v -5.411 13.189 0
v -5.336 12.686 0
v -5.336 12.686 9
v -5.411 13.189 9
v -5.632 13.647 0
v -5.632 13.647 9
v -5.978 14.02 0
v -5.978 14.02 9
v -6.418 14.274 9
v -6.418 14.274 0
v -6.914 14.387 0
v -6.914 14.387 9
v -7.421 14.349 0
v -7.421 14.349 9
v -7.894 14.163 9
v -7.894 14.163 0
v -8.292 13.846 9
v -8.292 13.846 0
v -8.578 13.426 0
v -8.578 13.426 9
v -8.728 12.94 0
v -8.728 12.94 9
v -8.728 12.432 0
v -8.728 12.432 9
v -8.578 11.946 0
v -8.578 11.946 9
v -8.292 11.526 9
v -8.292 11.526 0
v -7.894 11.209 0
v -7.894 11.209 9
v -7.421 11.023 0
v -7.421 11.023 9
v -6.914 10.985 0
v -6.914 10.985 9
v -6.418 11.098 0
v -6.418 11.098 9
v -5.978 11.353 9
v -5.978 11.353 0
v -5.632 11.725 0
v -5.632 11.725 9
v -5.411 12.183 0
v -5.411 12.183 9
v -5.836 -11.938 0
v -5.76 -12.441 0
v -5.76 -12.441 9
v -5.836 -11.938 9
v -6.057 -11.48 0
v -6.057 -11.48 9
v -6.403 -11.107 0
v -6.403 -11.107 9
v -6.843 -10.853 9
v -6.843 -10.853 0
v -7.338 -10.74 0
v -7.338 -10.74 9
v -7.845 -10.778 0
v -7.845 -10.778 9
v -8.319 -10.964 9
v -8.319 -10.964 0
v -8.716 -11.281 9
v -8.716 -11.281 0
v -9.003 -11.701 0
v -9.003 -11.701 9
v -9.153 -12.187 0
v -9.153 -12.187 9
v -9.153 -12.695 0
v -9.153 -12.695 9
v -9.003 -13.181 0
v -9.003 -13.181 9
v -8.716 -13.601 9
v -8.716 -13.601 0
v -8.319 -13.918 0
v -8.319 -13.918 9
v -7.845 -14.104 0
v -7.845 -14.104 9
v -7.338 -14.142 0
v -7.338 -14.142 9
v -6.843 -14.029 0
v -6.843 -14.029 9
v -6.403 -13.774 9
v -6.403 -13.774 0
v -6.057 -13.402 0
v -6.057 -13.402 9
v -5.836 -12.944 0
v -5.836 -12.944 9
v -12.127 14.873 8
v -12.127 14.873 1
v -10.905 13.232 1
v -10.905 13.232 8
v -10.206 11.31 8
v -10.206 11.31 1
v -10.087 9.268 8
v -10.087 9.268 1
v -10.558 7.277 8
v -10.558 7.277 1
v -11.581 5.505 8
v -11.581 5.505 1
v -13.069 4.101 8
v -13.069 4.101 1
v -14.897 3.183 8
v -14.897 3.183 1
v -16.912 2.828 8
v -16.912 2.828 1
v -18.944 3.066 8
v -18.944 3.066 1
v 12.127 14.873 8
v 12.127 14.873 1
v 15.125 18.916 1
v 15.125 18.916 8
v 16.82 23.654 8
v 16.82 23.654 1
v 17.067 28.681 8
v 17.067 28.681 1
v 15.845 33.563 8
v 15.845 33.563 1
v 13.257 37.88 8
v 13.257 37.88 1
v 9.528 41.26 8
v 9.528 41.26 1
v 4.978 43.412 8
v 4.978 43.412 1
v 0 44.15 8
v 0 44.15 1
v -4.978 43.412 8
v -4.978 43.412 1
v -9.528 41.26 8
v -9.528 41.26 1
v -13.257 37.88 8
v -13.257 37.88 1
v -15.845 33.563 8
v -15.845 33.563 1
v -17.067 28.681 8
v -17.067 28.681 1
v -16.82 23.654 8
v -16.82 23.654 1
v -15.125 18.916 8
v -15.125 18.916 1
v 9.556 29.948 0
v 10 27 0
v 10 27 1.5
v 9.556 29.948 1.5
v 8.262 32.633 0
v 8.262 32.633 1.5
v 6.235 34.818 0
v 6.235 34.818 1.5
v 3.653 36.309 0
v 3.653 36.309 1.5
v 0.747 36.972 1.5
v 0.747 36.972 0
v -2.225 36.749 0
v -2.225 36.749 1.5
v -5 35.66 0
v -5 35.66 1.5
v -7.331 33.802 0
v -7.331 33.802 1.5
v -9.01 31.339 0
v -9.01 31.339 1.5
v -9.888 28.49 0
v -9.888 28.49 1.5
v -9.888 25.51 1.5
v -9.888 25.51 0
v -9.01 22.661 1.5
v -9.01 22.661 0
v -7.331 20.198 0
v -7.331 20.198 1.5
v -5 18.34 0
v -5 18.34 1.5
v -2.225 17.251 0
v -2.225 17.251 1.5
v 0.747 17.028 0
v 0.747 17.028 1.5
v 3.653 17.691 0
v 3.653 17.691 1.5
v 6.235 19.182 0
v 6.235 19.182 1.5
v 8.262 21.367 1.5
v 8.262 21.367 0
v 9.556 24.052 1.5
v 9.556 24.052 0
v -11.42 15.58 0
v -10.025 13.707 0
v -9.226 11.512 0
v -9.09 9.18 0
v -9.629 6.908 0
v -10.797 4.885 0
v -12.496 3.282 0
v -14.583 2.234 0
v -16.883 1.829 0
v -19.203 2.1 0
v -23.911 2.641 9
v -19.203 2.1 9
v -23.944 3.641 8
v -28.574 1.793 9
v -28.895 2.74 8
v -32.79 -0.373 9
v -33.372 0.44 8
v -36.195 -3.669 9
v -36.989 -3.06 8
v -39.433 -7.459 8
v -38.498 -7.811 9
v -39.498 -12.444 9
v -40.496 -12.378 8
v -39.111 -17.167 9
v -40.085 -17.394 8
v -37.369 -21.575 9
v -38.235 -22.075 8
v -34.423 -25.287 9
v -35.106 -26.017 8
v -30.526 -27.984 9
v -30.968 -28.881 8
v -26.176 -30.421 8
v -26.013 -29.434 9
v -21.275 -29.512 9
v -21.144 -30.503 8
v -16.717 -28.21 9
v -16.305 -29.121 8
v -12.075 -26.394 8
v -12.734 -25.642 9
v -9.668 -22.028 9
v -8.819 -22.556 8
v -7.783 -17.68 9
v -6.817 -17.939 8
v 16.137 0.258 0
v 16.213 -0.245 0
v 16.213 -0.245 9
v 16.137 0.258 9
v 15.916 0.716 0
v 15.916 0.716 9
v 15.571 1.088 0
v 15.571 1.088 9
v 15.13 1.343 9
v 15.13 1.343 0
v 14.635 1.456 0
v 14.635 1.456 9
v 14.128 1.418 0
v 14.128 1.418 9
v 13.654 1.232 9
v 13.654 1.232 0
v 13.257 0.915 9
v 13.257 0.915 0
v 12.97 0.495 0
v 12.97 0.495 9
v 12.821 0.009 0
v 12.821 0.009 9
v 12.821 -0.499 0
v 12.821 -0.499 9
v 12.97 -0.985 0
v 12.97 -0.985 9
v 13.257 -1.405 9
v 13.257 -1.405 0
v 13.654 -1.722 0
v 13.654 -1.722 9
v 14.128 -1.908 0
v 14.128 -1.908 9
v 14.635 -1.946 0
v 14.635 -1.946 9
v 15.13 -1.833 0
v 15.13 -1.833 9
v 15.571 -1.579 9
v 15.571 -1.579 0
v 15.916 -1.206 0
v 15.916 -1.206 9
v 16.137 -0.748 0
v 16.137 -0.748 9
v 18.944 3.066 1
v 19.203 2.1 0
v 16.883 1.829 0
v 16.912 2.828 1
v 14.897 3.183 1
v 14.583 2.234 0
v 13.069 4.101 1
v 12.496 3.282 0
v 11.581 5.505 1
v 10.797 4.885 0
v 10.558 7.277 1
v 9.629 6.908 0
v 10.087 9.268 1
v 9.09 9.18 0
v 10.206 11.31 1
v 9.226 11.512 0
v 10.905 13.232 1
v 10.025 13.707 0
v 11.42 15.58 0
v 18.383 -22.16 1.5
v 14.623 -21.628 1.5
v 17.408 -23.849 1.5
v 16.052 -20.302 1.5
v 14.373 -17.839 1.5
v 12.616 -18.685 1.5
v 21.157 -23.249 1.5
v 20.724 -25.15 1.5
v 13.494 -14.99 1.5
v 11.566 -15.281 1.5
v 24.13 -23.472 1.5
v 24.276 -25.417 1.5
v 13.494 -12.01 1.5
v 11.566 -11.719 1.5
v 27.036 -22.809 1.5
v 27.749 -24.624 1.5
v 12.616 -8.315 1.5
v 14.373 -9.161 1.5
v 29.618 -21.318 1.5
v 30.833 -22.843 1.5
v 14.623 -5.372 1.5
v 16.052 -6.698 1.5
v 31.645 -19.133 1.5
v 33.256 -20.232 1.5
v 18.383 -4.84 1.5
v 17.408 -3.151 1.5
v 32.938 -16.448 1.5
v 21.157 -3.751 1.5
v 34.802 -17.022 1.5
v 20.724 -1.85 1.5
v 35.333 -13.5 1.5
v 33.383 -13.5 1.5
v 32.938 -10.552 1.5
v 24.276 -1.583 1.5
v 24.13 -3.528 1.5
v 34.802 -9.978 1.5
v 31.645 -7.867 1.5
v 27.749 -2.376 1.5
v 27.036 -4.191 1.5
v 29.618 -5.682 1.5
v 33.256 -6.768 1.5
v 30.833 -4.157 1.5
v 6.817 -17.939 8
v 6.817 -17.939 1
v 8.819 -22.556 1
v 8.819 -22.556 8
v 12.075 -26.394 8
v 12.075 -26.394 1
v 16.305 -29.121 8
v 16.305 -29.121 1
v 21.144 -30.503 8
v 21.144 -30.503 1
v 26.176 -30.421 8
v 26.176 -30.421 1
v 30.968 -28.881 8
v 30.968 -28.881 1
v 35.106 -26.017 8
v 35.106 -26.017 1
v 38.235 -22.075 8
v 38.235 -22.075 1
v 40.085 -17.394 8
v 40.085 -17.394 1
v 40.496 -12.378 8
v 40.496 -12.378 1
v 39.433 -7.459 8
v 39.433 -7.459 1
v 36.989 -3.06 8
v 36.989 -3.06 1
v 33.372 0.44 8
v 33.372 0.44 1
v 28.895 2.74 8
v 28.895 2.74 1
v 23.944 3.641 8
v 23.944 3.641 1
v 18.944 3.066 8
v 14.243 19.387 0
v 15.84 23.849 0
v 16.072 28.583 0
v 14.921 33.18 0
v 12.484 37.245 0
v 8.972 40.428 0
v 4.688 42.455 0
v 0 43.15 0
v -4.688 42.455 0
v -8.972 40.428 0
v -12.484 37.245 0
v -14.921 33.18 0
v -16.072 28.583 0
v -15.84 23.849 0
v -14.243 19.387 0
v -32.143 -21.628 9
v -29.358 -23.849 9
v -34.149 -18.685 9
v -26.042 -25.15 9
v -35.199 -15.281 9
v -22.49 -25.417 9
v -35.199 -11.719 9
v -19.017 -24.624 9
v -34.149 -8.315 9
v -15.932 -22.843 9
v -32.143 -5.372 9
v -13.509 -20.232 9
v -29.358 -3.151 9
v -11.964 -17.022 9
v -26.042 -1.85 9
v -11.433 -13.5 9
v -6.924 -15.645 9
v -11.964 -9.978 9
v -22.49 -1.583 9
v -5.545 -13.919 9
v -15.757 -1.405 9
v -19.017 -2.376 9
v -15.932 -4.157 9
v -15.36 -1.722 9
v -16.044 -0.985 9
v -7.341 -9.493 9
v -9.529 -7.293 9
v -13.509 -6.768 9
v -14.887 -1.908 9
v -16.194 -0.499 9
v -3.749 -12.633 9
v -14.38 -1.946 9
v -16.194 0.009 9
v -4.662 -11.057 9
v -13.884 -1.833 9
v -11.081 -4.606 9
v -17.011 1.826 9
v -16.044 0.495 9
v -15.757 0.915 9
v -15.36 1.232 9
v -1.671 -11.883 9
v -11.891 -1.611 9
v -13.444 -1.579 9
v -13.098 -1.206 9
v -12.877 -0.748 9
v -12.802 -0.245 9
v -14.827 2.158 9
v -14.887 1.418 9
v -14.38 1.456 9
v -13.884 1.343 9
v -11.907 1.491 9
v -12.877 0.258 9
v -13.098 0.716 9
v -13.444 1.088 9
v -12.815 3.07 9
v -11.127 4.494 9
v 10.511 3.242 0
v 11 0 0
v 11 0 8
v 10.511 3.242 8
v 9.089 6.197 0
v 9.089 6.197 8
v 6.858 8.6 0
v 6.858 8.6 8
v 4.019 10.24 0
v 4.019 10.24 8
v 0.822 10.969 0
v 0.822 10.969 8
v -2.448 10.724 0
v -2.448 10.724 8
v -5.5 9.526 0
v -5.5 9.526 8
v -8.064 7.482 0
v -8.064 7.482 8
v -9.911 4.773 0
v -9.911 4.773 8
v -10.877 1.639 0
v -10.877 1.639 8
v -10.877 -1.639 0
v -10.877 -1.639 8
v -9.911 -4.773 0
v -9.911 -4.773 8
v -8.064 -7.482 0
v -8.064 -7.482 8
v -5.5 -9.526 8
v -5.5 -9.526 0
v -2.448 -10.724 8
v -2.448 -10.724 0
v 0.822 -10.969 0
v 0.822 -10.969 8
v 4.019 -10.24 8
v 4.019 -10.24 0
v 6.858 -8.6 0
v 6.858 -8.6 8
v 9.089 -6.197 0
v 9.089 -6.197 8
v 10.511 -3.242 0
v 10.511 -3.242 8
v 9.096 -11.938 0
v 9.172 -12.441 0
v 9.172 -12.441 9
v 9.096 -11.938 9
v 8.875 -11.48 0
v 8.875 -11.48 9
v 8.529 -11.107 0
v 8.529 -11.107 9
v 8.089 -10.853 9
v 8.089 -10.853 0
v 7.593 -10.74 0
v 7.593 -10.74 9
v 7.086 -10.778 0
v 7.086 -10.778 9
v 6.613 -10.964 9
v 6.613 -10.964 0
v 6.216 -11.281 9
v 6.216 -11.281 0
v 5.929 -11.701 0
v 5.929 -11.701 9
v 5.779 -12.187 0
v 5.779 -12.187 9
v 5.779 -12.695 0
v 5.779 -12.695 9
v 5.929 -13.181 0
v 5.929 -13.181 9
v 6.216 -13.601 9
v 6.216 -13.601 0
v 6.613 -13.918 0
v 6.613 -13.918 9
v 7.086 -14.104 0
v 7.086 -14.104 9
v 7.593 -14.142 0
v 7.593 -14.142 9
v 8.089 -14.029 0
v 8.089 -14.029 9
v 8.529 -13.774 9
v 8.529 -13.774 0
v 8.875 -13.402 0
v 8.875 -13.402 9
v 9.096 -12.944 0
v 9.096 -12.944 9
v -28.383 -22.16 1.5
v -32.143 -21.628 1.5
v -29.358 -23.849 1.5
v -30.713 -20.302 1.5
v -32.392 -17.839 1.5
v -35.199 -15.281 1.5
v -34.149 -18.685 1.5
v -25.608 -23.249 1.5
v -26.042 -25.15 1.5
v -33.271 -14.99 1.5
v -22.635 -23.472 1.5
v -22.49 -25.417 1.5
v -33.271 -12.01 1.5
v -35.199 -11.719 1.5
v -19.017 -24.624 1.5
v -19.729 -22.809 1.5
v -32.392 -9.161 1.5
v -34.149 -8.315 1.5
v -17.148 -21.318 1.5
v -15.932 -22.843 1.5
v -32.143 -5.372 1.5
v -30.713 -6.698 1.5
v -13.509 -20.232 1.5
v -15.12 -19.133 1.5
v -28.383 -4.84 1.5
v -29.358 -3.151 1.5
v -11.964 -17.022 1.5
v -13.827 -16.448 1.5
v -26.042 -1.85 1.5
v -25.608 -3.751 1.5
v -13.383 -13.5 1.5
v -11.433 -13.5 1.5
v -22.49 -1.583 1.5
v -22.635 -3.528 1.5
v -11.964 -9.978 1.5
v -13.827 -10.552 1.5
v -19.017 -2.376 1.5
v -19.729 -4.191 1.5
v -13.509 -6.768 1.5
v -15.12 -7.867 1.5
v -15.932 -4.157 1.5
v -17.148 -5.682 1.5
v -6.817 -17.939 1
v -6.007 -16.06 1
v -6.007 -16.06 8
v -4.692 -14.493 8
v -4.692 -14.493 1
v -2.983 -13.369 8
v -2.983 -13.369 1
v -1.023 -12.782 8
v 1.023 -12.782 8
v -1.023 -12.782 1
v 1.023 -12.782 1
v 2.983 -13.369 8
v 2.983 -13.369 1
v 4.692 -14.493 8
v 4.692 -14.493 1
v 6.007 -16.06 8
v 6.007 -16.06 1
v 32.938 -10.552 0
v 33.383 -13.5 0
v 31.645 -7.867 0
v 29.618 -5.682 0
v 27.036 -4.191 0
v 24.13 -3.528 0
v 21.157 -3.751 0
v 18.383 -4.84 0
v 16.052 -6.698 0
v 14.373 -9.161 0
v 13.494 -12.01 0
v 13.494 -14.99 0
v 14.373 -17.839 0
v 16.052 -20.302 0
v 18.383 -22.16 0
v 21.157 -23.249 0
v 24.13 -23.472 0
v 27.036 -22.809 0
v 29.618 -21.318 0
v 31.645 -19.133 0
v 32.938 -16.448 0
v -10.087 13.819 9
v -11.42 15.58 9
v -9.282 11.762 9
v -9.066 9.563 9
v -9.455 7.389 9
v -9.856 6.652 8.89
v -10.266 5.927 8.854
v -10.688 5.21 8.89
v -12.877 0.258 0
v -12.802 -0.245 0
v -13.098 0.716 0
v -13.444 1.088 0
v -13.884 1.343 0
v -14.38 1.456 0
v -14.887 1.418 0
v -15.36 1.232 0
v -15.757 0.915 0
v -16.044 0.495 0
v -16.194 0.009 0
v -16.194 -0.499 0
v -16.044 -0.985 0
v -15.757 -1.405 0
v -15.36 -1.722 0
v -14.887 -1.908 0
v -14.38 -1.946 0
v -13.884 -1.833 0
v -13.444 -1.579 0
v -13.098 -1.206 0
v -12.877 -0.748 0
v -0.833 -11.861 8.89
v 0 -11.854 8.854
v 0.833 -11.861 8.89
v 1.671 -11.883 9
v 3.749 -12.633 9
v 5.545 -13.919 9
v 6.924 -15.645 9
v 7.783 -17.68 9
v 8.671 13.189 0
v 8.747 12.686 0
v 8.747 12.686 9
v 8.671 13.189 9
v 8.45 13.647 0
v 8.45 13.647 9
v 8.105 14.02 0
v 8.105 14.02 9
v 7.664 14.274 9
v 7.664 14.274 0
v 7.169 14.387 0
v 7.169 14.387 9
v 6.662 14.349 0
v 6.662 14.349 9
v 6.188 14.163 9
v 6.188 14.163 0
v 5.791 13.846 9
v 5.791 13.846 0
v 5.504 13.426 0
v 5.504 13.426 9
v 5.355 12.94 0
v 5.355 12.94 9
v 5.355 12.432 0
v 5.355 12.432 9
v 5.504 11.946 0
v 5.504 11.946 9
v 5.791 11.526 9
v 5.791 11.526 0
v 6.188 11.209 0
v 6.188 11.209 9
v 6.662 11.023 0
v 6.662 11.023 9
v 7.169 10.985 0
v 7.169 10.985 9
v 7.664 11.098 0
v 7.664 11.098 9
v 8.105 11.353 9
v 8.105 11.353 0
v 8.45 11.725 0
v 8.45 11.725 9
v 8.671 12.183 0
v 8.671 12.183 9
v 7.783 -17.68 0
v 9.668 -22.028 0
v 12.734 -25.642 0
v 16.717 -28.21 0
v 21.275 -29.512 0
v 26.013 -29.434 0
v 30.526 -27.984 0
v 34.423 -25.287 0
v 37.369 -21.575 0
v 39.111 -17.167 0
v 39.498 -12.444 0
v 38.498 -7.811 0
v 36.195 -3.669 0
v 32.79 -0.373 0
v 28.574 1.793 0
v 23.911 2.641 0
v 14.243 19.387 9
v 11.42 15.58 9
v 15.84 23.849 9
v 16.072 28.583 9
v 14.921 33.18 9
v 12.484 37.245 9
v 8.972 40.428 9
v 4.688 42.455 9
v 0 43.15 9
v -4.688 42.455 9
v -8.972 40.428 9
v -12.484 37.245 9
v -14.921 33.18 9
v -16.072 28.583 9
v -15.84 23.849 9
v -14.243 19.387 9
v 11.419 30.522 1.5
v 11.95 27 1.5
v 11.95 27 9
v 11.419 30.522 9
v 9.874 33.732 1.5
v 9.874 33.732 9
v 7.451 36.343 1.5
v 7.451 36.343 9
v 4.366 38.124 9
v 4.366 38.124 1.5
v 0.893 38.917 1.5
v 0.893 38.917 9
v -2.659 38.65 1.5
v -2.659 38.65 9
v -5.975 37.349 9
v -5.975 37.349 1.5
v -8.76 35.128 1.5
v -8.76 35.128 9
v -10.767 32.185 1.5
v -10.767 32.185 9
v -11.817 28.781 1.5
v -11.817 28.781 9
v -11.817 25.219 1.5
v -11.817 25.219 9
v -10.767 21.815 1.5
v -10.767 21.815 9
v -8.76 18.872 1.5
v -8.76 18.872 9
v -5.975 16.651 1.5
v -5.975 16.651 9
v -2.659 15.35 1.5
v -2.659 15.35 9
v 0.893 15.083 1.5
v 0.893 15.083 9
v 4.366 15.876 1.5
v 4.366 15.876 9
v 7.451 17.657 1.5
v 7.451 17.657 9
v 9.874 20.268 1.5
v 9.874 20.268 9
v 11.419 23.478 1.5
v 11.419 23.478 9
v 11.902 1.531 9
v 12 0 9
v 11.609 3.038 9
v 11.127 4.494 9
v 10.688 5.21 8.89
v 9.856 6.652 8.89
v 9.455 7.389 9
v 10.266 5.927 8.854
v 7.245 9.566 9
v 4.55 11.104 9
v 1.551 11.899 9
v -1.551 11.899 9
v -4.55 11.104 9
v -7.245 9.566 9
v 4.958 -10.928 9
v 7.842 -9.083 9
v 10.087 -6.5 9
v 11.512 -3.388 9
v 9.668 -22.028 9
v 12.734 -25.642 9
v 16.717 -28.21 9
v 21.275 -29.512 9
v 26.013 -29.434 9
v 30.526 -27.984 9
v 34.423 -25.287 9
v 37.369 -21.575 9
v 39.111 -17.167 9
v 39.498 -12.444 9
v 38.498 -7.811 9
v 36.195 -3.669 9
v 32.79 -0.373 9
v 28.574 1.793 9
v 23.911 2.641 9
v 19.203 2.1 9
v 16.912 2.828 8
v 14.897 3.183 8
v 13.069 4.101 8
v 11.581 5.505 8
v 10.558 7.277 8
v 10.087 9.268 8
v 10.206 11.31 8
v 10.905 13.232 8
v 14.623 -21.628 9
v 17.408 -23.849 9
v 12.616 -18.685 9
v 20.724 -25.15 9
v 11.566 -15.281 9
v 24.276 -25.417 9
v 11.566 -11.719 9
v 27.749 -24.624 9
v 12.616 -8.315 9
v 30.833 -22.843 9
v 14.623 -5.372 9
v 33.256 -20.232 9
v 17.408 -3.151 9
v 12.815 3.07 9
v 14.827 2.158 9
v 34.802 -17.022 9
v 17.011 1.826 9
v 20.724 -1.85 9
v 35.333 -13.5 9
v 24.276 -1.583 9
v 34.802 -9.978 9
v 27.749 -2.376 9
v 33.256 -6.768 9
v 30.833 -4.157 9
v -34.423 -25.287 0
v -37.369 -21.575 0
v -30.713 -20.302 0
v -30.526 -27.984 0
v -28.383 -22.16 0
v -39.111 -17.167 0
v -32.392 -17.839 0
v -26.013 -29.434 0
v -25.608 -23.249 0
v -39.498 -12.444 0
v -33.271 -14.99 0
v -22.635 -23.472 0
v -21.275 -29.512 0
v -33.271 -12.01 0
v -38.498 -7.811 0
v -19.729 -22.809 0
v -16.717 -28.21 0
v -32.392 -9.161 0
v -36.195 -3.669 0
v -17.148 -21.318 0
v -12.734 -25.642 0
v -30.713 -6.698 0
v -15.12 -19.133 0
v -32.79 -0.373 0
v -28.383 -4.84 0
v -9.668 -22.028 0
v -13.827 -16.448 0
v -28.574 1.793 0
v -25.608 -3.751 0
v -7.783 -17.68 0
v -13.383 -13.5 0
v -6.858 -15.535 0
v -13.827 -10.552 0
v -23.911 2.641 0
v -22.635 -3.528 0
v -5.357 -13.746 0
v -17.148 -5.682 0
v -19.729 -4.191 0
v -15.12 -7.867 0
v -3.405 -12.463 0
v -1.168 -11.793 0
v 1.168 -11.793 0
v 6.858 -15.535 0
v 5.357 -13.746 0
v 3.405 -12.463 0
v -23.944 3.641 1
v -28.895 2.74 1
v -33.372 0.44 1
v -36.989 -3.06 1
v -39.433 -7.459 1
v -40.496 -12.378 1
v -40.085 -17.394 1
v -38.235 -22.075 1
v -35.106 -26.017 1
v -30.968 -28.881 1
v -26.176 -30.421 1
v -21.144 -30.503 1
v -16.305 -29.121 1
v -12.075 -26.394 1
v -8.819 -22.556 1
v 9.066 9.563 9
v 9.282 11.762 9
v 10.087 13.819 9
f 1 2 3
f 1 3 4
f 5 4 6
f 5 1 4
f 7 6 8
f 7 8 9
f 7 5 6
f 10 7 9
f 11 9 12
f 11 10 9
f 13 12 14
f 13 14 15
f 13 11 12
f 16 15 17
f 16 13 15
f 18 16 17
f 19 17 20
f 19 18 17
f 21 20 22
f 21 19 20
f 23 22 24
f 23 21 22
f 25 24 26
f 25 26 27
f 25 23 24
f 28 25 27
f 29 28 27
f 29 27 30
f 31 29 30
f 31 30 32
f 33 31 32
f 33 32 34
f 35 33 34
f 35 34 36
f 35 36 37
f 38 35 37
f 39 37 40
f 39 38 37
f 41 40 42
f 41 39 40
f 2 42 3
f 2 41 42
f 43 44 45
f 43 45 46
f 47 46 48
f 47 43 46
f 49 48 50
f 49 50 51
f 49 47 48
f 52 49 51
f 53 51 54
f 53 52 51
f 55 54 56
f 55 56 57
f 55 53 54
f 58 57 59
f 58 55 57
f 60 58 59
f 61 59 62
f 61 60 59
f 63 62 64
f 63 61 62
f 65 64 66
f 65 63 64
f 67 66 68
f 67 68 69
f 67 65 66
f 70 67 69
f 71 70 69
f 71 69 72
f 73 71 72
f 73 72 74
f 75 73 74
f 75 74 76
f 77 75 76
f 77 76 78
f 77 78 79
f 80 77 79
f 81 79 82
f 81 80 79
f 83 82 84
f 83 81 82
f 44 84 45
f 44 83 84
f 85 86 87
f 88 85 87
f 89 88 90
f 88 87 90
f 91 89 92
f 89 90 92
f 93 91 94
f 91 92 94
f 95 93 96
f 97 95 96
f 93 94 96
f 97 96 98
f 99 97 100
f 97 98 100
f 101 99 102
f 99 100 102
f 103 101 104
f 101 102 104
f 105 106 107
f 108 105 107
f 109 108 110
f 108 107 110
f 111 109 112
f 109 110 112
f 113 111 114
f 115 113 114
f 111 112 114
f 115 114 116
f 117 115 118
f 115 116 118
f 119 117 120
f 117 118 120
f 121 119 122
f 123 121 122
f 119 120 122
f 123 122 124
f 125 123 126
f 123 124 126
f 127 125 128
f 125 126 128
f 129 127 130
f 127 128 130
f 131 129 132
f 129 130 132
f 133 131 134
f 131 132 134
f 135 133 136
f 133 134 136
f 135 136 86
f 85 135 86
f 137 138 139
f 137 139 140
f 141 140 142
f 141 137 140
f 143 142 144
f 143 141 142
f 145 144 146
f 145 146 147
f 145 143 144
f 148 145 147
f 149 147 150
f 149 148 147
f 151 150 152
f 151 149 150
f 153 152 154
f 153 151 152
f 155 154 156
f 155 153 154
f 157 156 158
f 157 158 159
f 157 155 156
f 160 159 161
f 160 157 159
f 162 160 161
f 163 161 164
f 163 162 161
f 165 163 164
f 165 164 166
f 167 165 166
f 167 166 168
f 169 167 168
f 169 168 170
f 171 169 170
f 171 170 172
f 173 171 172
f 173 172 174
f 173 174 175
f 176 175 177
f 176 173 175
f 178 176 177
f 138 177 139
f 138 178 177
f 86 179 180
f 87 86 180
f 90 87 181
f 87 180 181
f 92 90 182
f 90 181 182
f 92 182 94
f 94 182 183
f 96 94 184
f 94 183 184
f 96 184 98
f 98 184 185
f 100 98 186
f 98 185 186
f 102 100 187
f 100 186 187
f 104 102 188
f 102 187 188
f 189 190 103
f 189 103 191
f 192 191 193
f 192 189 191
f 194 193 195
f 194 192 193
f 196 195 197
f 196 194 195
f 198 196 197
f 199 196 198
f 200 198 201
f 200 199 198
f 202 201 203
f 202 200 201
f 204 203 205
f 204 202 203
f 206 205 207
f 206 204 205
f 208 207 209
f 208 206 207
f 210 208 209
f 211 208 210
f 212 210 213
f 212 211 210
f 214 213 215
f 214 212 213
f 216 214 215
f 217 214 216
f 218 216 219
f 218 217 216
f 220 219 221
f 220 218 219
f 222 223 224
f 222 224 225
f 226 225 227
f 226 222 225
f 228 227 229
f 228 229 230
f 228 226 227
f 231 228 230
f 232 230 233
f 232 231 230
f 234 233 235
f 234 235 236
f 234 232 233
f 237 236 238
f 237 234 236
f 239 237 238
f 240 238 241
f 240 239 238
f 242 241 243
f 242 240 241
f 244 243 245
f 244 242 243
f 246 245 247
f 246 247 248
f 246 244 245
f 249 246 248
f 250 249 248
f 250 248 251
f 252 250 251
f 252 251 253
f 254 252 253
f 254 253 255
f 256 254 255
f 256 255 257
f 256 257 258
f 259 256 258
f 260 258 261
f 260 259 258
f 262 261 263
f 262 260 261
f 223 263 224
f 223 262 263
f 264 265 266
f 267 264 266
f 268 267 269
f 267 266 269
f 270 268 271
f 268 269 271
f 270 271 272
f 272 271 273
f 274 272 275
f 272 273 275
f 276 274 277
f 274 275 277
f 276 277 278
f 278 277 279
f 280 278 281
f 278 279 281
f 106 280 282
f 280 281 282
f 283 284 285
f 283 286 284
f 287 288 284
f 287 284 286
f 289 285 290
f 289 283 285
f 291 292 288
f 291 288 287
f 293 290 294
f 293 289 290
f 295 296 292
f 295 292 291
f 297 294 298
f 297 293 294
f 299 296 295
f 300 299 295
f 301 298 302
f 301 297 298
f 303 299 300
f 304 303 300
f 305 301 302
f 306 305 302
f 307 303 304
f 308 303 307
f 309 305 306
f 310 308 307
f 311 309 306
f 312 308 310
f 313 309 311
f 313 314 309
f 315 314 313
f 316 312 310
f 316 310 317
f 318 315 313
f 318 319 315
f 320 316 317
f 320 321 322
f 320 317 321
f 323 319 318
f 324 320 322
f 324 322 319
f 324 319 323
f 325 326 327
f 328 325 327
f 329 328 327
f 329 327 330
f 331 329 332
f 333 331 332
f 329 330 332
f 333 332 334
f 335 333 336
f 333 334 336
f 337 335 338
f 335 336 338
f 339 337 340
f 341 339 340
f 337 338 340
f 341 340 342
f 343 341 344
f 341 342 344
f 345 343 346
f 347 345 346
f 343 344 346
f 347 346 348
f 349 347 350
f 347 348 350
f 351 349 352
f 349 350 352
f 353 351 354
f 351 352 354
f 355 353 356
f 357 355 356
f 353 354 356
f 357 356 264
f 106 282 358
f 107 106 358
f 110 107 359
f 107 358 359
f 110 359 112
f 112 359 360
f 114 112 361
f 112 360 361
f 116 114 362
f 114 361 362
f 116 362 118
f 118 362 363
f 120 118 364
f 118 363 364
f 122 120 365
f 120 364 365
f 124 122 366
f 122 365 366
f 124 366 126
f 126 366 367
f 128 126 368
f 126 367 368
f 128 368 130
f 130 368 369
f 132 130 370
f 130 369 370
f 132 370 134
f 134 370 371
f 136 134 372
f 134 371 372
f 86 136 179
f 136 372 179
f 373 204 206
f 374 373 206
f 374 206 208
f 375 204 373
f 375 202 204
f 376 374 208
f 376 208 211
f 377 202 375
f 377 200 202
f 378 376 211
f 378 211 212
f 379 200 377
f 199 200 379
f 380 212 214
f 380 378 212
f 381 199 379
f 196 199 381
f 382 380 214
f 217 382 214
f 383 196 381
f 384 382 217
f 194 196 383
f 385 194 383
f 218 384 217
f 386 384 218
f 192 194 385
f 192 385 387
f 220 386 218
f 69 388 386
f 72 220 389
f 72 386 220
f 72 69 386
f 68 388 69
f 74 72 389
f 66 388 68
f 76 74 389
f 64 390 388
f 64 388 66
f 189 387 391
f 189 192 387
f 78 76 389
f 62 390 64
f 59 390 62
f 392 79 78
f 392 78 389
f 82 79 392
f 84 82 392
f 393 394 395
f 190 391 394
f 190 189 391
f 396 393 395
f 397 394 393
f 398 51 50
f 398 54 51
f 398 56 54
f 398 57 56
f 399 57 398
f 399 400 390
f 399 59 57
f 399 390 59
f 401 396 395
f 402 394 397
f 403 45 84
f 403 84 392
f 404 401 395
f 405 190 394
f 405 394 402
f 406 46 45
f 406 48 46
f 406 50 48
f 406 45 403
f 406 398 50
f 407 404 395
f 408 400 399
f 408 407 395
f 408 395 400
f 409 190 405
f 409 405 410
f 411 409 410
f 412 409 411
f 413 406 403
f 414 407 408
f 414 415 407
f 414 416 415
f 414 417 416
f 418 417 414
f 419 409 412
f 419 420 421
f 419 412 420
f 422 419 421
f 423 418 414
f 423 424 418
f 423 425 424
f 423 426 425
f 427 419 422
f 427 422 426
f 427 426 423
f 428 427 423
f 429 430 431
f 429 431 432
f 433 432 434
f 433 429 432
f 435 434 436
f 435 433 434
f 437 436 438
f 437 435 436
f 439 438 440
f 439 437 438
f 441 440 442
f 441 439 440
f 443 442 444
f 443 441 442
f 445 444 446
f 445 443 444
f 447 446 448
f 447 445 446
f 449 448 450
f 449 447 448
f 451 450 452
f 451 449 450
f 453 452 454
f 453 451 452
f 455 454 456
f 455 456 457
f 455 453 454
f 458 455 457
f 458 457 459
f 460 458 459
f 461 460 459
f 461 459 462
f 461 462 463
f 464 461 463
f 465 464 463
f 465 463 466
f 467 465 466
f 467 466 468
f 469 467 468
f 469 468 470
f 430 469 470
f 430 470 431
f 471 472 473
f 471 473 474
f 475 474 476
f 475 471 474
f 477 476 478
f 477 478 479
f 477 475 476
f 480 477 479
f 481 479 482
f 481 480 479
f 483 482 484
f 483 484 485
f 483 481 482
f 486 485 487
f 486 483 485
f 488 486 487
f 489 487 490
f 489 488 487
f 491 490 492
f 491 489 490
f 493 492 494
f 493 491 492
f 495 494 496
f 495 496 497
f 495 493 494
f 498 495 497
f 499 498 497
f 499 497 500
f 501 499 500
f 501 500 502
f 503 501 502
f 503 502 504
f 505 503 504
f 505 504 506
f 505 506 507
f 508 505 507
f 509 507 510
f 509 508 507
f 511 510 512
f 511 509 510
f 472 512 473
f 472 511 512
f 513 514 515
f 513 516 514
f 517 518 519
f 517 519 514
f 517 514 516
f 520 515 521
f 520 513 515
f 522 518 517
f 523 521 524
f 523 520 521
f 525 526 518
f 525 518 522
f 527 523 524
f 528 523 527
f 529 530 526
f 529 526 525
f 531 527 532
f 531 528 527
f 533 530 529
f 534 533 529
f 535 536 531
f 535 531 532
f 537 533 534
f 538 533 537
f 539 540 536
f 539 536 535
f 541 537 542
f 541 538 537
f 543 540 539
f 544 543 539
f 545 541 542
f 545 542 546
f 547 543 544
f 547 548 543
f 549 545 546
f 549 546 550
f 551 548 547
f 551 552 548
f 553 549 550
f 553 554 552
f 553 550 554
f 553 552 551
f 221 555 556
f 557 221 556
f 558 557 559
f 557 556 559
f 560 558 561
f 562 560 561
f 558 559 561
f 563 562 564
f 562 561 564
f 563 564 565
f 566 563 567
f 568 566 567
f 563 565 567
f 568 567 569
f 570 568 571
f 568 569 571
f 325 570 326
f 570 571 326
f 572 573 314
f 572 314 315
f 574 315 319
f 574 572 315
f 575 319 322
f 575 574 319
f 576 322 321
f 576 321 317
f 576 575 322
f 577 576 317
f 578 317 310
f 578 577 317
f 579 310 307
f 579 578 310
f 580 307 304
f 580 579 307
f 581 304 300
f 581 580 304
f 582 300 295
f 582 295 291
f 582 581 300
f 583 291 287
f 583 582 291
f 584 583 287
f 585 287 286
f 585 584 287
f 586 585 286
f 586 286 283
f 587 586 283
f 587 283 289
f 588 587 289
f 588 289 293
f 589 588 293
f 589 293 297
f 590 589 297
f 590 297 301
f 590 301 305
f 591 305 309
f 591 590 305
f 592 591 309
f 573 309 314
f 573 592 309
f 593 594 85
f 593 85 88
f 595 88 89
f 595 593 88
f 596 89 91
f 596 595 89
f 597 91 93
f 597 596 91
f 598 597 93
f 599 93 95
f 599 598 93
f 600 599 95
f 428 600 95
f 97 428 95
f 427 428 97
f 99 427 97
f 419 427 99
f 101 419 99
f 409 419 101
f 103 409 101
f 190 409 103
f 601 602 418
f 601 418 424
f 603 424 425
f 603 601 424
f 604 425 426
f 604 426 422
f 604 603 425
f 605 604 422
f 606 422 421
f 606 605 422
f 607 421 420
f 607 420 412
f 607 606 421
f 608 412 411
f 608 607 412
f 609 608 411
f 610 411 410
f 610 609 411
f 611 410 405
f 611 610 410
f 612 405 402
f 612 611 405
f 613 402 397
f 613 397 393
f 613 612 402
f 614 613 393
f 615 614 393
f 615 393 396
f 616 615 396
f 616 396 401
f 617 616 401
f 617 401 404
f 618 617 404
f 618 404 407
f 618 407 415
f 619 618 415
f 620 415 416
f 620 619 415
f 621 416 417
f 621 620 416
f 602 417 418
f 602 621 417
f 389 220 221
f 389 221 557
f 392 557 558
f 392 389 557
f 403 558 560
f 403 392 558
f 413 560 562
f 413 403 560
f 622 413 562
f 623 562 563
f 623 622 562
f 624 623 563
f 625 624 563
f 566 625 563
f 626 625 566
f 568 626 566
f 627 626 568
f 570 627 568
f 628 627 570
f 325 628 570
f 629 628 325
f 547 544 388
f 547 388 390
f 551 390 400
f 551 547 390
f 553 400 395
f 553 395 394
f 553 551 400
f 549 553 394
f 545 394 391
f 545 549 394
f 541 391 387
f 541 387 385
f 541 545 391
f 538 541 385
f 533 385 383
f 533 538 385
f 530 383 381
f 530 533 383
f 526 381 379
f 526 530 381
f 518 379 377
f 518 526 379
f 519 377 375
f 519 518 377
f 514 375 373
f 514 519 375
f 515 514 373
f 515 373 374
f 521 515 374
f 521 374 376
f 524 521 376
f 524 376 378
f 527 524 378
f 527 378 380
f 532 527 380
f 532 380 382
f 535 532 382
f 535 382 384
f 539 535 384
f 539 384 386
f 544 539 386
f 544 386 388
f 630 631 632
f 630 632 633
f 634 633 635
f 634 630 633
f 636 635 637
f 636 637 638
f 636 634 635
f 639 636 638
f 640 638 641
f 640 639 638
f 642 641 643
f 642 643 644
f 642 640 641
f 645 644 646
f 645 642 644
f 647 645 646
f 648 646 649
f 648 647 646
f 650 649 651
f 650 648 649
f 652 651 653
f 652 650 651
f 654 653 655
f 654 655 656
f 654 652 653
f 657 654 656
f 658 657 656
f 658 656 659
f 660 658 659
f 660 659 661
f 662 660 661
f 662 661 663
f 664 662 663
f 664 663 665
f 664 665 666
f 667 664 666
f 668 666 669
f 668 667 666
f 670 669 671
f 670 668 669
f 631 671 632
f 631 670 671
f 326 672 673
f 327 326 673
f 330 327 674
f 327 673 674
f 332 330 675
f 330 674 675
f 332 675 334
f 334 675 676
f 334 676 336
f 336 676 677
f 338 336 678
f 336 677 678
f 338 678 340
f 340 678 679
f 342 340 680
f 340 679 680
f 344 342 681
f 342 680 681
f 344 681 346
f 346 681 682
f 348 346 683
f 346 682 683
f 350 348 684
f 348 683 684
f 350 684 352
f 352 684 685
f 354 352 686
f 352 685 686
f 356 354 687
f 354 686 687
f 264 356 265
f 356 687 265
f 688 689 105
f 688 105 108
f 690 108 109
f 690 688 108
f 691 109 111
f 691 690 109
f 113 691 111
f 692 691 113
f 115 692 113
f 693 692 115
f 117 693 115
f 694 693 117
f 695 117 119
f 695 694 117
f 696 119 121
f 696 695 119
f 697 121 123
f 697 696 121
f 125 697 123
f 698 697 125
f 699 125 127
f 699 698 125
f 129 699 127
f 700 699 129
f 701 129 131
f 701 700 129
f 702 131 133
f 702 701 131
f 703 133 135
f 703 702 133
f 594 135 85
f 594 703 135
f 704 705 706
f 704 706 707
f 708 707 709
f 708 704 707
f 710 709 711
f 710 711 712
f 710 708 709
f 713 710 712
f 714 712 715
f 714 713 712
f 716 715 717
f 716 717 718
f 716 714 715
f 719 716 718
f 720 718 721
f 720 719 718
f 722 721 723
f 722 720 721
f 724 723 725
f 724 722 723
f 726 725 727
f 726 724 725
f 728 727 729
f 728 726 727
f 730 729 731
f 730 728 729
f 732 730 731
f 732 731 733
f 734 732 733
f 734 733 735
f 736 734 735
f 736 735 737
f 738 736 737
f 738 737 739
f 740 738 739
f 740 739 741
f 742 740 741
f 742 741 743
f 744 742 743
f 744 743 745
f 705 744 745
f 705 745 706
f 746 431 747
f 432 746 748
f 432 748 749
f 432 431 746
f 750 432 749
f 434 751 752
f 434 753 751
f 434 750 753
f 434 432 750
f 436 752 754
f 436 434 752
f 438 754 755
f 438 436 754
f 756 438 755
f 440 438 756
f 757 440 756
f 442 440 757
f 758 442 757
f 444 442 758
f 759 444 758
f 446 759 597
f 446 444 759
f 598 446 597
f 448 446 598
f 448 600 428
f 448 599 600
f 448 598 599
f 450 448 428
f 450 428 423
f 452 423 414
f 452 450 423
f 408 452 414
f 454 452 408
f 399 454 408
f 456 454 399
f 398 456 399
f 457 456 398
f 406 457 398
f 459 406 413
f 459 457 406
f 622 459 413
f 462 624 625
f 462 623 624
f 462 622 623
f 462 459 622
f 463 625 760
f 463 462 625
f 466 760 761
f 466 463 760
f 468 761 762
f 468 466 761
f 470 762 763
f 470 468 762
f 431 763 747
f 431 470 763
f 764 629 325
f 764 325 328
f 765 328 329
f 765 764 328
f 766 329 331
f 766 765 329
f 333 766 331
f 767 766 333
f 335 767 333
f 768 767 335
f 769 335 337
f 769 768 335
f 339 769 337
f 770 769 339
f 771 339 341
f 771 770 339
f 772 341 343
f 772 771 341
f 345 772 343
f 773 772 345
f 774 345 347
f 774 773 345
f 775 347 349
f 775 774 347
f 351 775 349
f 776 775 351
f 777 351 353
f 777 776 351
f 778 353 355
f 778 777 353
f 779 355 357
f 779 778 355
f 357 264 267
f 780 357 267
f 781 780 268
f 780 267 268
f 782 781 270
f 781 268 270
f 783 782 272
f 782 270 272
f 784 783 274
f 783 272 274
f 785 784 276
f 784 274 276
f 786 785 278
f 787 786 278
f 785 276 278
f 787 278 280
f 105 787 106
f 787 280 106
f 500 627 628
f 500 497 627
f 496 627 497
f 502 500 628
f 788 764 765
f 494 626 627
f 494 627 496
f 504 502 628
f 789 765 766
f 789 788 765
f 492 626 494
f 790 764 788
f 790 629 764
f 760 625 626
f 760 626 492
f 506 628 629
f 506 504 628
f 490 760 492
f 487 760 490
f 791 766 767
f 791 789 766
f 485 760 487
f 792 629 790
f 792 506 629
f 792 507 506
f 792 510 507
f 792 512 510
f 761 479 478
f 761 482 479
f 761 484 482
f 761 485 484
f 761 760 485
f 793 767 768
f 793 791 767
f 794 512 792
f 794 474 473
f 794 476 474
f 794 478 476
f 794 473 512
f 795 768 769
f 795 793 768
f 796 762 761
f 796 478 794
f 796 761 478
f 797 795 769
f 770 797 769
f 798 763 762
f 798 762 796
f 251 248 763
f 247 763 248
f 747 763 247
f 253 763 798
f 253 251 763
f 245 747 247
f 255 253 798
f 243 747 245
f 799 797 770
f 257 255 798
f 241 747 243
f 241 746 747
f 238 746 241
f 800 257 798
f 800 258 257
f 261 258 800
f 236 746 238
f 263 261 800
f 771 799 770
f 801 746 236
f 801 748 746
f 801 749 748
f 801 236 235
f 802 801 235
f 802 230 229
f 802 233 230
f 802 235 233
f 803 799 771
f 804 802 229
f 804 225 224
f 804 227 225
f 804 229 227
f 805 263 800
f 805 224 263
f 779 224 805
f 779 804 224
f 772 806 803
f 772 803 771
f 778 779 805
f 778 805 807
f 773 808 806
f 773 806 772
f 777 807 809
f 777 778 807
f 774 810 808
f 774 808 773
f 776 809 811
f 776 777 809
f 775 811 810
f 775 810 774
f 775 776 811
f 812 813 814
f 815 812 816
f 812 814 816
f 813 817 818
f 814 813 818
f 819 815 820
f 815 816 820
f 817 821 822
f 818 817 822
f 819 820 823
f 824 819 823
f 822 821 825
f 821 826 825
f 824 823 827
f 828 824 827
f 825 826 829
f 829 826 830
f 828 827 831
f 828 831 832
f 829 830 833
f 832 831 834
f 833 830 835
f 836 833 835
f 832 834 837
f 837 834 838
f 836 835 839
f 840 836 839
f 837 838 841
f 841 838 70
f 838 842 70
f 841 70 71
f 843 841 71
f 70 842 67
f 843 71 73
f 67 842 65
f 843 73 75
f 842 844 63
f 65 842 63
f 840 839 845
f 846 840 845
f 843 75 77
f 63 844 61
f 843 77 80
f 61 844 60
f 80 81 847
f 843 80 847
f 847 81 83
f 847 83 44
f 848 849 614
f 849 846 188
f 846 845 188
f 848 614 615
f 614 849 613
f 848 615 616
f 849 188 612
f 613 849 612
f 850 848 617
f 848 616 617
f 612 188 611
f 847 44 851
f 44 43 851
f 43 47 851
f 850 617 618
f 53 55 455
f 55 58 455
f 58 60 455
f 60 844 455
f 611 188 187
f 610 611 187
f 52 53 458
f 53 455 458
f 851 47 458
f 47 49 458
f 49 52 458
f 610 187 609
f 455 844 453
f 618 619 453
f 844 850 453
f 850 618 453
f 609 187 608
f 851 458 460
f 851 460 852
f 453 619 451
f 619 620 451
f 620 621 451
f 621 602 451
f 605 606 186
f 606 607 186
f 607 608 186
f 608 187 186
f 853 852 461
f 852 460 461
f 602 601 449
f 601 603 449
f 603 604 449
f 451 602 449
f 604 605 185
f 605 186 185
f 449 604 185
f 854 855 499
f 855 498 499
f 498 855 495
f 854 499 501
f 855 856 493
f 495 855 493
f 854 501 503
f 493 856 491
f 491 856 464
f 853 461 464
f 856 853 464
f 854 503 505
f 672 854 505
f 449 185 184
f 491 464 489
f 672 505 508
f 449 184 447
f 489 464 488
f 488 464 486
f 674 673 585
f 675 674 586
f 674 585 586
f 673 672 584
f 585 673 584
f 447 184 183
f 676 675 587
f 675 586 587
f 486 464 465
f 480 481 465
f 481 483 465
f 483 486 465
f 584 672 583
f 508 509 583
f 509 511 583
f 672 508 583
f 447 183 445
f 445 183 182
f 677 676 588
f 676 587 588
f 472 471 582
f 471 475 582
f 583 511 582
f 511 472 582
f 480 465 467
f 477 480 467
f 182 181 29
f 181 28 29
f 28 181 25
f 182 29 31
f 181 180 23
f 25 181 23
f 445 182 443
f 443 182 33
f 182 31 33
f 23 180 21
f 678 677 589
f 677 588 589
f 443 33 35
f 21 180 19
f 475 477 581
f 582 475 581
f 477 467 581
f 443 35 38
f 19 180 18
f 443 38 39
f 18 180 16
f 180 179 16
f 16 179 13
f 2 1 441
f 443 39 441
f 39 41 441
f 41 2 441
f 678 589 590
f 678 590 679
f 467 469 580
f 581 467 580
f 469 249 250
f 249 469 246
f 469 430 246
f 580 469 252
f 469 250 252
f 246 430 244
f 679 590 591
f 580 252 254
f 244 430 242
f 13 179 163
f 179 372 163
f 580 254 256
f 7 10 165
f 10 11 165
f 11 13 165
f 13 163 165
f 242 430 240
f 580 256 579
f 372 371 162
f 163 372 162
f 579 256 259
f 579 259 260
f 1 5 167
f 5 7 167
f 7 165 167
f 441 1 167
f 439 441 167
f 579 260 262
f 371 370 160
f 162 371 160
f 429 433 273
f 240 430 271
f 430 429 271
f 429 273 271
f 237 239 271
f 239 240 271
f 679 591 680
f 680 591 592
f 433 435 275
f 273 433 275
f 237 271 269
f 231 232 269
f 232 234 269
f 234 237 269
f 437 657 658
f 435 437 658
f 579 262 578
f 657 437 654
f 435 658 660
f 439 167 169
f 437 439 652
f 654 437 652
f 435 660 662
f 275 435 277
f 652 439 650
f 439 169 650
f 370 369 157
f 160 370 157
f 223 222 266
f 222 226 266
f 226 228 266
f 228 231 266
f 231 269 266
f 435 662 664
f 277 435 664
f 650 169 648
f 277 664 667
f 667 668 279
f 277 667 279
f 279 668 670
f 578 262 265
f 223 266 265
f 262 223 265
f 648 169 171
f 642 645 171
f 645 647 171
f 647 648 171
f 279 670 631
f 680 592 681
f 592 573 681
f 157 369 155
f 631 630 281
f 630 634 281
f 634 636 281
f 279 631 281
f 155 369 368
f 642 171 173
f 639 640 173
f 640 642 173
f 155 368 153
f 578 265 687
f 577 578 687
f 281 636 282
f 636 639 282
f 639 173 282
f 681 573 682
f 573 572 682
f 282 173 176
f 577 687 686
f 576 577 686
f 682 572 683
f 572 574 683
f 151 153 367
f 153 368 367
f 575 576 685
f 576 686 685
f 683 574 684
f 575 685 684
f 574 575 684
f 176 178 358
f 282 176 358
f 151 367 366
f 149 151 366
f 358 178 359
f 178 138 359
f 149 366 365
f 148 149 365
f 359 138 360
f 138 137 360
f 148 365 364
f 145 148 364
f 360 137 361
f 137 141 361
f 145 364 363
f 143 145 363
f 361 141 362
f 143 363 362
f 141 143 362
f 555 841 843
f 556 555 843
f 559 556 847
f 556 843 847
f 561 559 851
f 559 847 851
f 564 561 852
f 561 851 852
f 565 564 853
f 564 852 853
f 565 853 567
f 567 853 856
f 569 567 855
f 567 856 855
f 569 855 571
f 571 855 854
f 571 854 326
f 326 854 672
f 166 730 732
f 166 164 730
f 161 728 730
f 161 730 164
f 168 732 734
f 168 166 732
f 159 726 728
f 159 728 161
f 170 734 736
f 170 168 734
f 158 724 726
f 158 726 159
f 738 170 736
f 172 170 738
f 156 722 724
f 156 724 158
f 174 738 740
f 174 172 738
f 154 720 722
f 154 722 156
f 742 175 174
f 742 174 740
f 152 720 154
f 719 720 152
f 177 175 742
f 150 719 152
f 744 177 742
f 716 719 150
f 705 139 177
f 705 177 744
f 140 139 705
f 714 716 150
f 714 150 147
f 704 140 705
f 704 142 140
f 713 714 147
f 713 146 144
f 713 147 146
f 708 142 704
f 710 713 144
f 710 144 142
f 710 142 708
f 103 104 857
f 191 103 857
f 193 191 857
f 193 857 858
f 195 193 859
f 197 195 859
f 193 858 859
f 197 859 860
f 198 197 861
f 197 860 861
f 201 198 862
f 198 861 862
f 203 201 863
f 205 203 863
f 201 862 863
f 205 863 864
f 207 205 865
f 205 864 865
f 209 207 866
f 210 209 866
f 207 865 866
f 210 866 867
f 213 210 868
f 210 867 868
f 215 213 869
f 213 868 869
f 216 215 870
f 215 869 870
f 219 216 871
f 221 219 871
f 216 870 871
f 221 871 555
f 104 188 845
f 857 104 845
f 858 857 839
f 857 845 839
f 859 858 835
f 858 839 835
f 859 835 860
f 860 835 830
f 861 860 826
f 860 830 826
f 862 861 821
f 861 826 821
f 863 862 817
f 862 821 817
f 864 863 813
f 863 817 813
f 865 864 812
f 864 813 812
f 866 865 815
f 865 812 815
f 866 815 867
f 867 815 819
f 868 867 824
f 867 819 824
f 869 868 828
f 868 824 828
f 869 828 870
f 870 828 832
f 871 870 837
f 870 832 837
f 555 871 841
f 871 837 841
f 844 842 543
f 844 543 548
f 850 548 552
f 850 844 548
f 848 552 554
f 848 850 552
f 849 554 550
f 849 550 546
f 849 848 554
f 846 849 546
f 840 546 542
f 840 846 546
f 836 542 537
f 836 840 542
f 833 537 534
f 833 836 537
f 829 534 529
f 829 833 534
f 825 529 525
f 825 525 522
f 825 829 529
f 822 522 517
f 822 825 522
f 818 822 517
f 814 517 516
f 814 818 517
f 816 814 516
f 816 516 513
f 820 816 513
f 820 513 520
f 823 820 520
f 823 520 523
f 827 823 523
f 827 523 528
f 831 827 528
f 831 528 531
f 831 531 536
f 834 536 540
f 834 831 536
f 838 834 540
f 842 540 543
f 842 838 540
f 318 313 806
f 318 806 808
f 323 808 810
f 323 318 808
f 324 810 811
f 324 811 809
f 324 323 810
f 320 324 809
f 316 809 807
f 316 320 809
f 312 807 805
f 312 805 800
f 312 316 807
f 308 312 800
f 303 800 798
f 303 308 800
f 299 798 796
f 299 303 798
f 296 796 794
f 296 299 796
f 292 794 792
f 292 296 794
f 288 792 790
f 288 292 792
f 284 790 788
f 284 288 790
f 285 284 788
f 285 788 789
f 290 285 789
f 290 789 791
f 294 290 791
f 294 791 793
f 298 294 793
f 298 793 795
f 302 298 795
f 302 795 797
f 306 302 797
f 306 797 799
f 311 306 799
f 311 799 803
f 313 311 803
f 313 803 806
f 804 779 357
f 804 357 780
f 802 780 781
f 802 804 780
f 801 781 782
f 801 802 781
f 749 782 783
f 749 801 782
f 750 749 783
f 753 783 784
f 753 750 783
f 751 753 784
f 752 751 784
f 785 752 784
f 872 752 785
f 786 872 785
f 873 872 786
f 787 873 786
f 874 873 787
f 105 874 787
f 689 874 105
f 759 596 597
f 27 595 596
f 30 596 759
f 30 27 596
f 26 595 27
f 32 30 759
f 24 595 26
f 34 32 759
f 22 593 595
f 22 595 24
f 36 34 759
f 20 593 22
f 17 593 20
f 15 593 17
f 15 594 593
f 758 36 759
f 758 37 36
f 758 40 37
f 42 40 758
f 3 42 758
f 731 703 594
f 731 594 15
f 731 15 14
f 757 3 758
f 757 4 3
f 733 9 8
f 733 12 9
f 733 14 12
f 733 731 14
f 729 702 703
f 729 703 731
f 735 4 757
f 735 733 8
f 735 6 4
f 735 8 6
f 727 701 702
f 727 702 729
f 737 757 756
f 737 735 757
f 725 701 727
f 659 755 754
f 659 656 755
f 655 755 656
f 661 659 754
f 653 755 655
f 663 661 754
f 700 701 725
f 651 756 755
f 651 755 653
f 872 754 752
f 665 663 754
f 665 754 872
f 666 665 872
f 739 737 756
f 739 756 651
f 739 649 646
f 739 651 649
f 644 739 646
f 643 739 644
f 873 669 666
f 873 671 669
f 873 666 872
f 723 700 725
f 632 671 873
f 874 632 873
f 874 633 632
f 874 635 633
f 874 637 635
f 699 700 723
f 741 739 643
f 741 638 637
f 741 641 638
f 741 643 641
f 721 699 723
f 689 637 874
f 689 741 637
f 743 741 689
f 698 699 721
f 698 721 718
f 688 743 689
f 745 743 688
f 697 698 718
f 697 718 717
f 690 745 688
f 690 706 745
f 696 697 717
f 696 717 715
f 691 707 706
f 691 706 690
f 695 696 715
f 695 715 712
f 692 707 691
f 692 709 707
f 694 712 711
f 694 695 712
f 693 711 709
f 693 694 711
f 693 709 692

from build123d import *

# Parameters (mm, degrees)
F0_R     = 11.95
F0_R_2   = 1.705642275
F0_R_3   = 11
F1_DEPTH = 9
F2_SIZE  = 1
F0_R_4   = 10
F3_DEPTH = 1.5


# Not quite as in the source:
# - a fillet or chamfer that OpenCascade refuses, or shapes differently, is made with other operations: its cross-section is extruded or revolved along the edge and cut away or added


with BuildPart() as f1:
    # F0 (on Top) → F1 (new body)
    with BuildSketch(Plane.XY):
        with BuildLine():
            ThreePointArc((18.9439392787, 3.0656279209), (11.0053071194, 6.3539170279), (12.1268812973, 14.8731187027))
            ThreePointArc((12.1268812973, 14.8731187027), (0, 44.15), (-12.1268812973, 14.8731187027))
            ThreePointArc((-12.1268812973, 14.8731187027), (-11.0053071194, 6.3539170279), (-18.9439392787, 3.0656279209))
            ThreePointArc((-18.9439392787, 3.0656279209), (-38.2350215771, -22.075), (-6.8170579813, -17.9387466235))
            ThreePointArc((-6.8170579813, -17.9387466235), (0, -12.7078340558), (6.8170579813, -17.9387466235))
            ThreePointArc((6.8170579813, -17.9387466235), (38.2350215771, -22.075), (18.9439392787, 3.0656279209))
        make_face()
        with Locations((-23.3826859022, -13.5)):
            Circle(F0_R, mode=Mode.SUBTRACT)
        with Locations((-7.4659583891, -12.4409667216)):
            Circle(F0_R_2, mode=Mode.SUBTRACT)
        with Locations((-14.5071724231, -0.2452262678)):
            Circle(F0_R_2, mode=Mode.SUBTRACT)
        with Locations((7.4659583891, -12.4409667216)):
            Circle(F0_R_2, mode=Mode.SUBTRACT)
        with Locations((23.3826859022, -13.5)):
            Circle(F0_R, mode=Mode.SUBTRACT)
        Circle(F0_R_3, mode=Mode.SUBTRACT)
        with Locations((14.5071724231, -0.2452262678)):
            Circle(F0_R_2, mode=Mode.SUBTRACT)
        with Locations((-7.041214034, 12.6861929893)):
            Circle(F0_R_2, mode=Mode.SUBTRACT)
        with Locations((7.041214034, 12.6861929893)):
            Circle(F0_R_2, mode=Mode.SUBTRACT)
        with Locations((0, 27)):
            Circle(F0_R, mode=Mode.SUBTRACT)
    extrude(amount=F1_DEPTH)

    # F2
    f2_edges = [f1.edges().sort_by_distance(p)[0] for p in [
        (-38.235022, -22.075, 9),
        (0, -12.707834, 9),
        (38.235022, -22.075, 9),
        (38.235022, -22.075, 0),
        (0, -12.707834, 0),
        (-38.235022, -22.075, 0),
        (-11.005307, 6.353917, 9),
        (-11.005307, 6.353917, 0),
        (0, 44.15, 0),
        (0, 44.15, 9),
        (11.005307, 6.353917, 9),
        (11.005307, 6.353917, 0),
    ]]
    chamfer(f2_edges, length=F2_SIZE)

    # F0 (on Top) → F3 (join)
    with BuildSketch(Plane.XY):
        with Locations((0, 27)):
            Circle(F0_R)
        with Locations((0, 27)):
            Circle(F0_R_4, mode=Mode.SUBTRACT)
        with Locations((-23.3826859022, -13.5)):
            Circle(F0_R)
        with Locations((-23.3826859022, -13.5)):
            Circle(F0_R_4, mode=Mode.SUBTRACT)
        with Locations((23.3826859022, -13.5)):
            Circle(F0_R)
        with Locations((23.3826859022, -13.5)):
            Circle(F0_R_4, mode=Mode.SUBTRACT)
    extrude(amount=F3_DEPTH)

    # F4: chamfer of 1 on 1 edges, made by hand

    # F4_s1 → F4_t2 (revolve, cut)
    with BuildSketch(Plane.XZ):
        Polygon((12, 9), (11, 8), (11, 9), align=None)
    revolve(axis=Axis((0, 0, 9), (0, 0, 1)), mode=Mode.SUBTRACT)


solid = f1.part
